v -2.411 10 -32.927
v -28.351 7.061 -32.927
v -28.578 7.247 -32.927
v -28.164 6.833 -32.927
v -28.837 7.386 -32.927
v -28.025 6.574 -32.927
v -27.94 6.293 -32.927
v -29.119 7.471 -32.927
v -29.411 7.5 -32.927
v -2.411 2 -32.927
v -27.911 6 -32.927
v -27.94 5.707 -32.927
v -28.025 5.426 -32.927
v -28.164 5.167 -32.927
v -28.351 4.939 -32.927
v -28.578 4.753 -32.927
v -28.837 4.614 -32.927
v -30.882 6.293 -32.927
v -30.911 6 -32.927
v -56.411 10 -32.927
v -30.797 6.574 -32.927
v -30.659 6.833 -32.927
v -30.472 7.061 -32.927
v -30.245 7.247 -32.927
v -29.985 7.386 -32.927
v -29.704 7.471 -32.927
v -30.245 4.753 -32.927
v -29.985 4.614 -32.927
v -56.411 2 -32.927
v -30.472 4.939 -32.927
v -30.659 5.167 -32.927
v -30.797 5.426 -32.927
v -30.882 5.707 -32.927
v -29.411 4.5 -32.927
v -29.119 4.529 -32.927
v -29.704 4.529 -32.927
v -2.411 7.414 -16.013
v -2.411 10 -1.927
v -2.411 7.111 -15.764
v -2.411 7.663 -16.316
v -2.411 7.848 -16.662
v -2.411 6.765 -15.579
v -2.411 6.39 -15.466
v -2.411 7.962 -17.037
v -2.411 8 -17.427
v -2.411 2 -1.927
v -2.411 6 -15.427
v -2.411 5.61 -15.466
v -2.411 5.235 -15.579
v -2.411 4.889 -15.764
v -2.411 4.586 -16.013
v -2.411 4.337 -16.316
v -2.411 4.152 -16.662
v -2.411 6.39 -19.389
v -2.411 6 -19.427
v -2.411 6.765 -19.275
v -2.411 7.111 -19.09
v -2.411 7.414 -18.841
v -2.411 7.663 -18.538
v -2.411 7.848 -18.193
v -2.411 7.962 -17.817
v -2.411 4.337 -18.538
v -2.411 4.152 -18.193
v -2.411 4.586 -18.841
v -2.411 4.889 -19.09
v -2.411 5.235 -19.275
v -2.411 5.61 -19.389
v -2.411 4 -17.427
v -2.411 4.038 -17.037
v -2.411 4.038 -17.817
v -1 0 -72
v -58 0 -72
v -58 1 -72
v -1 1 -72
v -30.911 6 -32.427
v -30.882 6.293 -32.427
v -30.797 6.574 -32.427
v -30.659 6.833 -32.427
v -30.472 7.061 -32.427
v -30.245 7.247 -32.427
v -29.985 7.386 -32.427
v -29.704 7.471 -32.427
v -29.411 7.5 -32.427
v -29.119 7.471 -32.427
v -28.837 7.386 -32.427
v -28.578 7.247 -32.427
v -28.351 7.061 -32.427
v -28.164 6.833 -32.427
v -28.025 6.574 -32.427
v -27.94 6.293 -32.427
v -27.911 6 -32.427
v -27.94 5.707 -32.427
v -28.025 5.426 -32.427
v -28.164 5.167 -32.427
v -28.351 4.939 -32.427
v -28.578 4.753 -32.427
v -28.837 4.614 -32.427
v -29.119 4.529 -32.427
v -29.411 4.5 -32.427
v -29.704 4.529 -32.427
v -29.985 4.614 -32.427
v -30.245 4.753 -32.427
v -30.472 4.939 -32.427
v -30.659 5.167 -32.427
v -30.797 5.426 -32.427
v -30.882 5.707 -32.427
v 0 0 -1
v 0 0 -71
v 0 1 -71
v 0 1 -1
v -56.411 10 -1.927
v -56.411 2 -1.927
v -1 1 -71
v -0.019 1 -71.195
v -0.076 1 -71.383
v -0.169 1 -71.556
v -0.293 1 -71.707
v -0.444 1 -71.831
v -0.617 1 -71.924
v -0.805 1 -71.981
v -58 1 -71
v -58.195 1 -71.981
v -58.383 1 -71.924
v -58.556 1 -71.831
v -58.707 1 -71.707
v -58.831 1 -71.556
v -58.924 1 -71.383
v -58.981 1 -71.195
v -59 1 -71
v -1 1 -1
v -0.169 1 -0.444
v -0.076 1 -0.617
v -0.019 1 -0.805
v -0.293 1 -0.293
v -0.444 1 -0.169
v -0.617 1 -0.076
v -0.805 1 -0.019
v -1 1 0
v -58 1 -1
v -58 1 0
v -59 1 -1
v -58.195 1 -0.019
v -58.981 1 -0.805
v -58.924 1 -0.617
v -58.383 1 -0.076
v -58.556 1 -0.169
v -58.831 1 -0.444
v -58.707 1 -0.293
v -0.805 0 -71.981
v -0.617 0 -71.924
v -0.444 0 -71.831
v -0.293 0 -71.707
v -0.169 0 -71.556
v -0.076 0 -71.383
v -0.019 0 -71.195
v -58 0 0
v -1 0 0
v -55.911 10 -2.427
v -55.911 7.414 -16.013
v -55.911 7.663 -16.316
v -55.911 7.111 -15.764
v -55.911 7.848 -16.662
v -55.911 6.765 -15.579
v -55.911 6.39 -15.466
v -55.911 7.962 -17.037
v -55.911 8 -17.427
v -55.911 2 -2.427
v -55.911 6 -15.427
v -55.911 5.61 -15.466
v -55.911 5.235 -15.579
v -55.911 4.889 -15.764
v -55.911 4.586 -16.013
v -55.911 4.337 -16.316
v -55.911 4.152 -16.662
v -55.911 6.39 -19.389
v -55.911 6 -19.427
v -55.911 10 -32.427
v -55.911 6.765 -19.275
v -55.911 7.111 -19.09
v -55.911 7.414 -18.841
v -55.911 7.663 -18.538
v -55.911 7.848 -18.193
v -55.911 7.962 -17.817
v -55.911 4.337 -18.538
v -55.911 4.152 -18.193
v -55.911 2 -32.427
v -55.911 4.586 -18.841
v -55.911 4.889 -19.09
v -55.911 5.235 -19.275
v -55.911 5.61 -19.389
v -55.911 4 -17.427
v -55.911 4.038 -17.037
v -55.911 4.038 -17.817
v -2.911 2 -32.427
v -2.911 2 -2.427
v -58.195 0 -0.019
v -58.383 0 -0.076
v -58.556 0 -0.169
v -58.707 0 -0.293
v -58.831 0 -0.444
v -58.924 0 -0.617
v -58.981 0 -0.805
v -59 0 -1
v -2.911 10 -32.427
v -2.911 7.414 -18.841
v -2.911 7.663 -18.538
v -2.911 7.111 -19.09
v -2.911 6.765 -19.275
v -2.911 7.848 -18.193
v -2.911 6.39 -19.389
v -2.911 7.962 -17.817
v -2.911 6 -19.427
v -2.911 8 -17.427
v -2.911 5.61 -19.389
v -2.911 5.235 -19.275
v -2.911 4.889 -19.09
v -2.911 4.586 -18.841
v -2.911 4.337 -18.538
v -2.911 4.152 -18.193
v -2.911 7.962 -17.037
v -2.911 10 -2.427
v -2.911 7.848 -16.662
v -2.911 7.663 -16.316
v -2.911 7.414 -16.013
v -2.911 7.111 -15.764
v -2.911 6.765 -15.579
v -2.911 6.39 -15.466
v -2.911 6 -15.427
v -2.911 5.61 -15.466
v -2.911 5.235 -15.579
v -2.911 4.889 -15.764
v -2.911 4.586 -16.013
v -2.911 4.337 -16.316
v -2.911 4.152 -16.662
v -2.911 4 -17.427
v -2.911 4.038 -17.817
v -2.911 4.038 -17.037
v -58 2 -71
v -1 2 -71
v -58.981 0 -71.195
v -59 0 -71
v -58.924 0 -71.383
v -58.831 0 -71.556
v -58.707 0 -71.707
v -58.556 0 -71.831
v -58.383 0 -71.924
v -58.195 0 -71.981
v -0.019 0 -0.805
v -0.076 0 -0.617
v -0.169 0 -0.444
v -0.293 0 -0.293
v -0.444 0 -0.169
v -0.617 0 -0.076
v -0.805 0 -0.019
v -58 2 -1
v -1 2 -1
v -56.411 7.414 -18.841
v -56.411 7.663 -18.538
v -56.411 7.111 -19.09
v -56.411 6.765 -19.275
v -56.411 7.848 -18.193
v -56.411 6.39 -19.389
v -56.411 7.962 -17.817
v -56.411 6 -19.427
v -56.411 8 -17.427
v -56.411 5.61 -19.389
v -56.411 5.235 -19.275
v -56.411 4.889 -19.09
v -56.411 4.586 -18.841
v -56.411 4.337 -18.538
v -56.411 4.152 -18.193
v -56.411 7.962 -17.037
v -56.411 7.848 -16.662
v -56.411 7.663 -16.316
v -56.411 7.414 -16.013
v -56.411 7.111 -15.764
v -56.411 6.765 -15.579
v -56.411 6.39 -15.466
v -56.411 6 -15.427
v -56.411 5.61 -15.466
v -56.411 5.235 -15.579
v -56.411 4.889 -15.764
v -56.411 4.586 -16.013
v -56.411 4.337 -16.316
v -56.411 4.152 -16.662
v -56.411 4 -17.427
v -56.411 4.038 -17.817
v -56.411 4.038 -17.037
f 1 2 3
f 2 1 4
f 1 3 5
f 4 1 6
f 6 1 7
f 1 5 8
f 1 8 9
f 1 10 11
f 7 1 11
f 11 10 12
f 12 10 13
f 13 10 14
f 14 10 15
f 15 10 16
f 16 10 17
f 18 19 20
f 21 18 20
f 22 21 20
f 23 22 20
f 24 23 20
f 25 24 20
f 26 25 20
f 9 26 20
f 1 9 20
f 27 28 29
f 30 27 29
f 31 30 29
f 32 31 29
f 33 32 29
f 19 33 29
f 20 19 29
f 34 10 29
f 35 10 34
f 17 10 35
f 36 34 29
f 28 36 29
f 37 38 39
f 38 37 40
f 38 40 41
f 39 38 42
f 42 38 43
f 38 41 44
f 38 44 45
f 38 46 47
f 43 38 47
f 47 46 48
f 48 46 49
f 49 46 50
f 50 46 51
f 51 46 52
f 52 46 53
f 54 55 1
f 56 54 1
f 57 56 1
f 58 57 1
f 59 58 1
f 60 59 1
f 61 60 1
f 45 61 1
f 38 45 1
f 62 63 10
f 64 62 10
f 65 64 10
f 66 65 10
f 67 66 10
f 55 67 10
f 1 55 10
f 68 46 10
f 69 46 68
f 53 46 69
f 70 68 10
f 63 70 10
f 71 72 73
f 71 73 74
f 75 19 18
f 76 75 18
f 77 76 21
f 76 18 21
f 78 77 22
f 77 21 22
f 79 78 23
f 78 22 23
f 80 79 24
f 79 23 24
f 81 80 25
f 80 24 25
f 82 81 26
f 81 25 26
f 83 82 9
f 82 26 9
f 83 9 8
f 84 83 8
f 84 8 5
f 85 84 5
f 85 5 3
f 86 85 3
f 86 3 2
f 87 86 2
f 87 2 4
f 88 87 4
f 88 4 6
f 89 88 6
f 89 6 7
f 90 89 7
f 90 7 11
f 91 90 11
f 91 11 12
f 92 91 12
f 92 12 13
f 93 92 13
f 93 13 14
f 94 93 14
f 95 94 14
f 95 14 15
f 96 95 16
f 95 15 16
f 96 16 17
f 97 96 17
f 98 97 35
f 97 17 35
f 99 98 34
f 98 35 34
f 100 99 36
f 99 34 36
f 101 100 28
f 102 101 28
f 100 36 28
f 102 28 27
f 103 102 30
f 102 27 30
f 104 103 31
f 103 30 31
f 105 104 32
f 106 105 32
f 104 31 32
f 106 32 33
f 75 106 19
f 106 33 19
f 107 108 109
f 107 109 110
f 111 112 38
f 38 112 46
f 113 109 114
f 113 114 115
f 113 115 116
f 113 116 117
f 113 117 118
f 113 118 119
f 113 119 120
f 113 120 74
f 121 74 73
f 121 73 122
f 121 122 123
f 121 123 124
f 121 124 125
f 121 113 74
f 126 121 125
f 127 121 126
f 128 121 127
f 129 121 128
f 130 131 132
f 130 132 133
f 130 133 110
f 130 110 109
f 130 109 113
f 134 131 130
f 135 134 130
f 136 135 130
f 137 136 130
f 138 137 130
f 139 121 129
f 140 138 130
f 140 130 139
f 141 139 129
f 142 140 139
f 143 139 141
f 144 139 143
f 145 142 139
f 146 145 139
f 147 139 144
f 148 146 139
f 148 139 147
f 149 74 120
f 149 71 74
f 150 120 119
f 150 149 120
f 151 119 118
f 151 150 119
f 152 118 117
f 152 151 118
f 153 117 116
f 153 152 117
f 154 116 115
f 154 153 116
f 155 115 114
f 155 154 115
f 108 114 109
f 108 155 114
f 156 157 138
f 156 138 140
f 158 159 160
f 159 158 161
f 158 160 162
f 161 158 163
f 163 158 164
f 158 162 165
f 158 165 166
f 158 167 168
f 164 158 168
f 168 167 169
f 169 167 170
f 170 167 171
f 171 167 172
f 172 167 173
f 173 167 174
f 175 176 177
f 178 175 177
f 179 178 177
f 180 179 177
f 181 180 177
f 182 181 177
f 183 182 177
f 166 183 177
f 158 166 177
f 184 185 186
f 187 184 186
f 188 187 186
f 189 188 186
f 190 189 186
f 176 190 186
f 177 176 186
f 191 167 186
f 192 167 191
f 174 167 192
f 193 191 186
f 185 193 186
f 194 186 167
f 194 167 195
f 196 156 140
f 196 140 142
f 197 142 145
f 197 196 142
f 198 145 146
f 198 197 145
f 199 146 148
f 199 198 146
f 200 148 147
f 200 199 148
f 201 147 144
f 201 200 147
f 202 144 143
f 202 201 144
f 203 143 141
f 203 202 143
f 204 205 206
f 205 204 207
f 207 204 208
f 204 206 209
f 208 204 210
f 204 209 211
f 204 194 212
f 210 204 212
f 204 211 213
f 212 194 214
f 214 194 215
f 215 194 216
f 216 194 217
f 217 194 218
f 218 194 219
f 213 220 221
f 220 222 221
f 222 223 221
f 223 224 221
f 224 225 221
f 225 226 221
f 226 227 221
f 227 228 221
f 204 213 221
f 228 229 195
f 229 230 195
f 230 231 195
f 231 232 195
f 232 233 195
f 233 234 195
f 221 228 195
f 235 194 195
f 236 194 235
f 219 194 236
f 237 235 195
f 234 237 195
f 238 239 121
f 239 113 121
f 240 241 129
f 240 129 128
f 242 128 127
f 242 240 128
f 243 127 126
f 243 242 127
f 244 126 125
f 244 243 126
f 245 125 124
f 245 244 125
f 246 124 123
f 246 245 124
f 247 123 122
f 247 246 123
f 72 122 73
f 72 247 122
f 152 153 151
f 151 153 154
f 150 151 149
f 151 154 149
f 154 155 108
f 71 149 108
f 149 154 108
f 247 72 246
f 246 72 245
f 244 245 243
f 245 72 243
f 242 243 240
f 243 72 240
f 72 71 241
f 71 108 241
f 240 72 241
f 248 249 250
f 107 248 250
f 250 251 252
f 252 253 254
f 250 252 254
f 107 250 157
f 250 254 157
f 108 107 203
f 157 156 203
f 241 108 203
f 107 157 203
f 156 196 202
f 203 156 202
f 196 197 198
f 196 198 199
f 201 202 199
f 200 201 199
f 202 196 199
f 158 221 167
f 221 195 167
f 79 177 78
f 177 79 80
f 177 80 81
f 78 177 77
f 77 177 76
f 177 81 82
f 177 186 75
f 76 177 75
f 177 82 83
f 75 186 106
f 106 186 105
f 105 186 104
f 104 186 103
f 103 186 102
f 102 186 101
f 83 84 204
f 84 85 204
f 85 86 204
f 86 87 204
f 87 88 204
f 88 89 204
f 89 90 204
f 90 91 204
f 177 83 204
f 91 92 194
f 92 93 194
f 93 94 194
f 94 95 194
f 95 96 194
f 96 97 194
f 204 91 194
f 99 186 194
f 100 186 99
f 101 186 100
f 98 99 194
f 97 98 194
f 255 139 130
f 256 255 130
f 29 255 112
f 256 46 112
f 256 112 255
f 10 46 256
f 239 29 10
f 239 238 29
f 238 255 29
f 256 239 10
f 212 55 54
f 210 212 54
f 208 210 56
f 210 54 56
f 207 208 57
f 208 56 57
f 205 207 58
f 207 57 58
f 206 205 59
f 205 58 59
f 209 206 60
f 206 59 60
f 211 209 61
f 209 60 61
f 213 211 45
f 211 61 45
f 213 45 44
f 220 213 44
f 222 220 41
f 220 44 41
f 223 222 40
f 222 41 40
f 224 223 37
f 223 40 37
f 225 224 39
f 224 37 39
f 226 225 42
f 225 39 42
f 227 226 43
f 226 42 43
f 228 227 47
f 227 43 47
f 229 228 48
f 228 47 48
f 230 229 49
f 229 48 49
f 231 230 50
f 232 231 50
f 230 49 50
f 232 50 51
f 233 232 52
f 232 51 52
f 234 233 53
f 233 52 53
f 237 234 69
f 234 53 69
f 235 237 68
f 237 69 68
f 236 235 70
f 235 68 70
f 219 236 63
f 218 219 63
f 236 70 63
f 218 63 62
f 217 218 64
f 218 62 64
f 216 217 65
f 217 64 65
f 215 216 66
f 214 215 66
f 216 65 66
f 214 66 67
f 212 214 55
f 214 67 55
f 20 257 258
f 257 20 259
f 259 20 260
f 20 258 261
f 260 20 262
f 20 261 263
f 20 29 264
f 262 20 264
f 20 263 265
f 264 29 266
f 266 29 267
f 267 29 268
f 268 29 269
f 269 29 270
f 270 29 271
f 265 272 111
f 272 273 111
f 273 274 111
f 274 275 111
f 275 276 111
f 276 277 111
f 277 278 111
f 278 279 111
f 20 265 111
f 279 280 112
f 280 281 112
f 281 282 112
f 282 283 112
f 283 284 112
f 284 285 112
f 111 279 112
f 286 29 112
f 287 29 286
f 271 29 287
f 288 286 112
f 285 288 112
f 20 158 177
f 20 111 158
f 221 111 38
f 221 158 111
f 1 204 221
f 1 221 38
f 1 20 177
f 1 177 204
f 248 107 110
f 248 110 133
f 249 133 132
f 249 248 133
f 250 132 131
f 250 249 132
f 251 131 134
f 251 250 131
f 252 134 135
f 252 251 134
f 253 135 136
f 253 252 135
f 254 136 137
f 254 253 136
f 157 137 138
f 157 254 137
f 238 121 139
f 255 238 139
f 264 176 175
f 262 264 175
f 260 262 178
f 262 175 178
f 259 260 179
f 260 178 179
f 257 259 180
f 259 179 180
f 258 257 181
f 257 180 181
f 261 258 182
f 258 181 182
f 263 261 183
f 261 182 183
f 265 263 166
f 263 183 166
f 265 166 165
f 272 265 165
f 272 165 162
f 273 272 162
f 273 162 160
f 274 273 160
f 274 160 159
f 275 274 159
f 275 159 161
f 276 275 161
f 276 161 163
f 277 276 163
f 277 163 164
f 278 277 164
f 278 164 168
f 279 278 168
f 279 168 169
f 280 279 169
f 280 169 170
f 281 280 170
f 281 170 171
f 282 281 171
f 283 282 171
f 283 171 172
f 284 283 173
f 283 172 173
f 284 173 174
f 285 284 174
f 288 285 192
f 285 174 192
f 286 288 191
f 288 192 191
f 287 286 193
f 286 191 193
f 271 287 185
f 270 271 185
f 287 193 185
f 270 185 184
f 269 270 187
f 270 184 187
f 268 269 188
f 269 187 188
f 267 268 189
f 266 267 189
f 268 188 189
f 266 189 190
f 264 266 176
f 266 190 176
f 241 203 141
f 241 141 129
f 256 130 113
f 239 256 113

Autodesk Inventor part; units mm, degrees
ref_plane "YZ Plane" through (0, 0, 0) normal (1, 0, 0) x (0, 1, 0)
ref_plane "XZ Plane" through (0, 0, 0) normal (0, 1, 0) x (-1, 0, 0)
ref_plane "XY Plane" through (0, 0, 0) normal (0, 0, 1) x (1, 0, 0)
sketch "Sketch1" plane through (0, 0, 0) normal (0, 1, 0) x (-1, 0, 0)
  line L0 (1, 0) -> (58, 0)
  line L1 (59, -1) -> (59, -71)
  line L2 (58, -72) -> (1, -72)
  line L3 (0, -71) -> (0, -1)
  arc A0 (59, -1) -> (58, 0) centre (58, -1) ccw
  arc A1 (58, -72) -> (59, -71) centre (58, -71) ccw
  arc A2 (0, -71) -> (1, -72) centre (1, -71) ccw
  arc A3 (1, 0) -> (0, -1) centre (1, -1) ccw
  point P0 (0, 0)
  point P1 (59, -72)
  point P2 (59, 0)
  point P3 (0, -72)
  dimension "d0" = 72
  dimension "d1" = 59
  dimension "d2" = 1
extrude "Extrusion1" add sketch "Sketch1" along normal blind 1
sketch "Sketch2" plane through (0, 1, 0) normal (0, 1, 0) x (1, 0, 0)
  line L0 (-55.9113, 2.4272) -> (-2.9113, 2.4272)
  line L1 (-2.9113, 2.4272) -> (-2.9113, 32.4272)
  line L2 (-2.9113, 32.4272) -> (-55.9113, 32.4272)
  line L3 (-55.9113, 32.4272) -> (-55.9113, 2.4272)
  line L4 (-56.4113, 1.9272) -> (-2.4113, 1.9272)
  line L5 (-2.4113, 1.9272) -> (-2.4113, 32.9272)
  line L6 (-2.4113, 32.9272) -> (-56.4113, 32.9272)
  line L7 (-56.4113, 32.9272) -> (-56.4113, 1.9272)
  point P0 (0, 0)
  dimension "d5" = 30
  dimension "d6" = 53
  dimension "d7" = 0.5
  dimension "d8" = 0.5
  dimension "d9" = 0.5
  dimension "d10" = 0.5
extrude "Extrusion2" add sketch "Sketch2" along normal blind 4
sketch "Sketch3" plane through (0, 1, 0) normal (0, 1, 0) x (1, 0, 0)
  arc A0 (0, 71) -> (-1, 72) centre (-1, 71) ccw projected
  line L0 (-58, 1) -> (-1, 1)
  line L1 (-1, 1) -> (-1, 71)
  line L2 (-1, 71) -> (-58, 71)
  line L3 (-58, 71) -> (-58, 1)
  line L4 (-1, 72) -> (-58, 72) projected
  line L5 (-59, 71) -> (-59, 1) projected
  line L6 (-58, 0) -> (-1, 0) projected
  line L7 (0, 1) -> (0, 71) projected
  point P0 (0, 0)
  dimension "d13" = 1
  dimension "d14" = 1
  dimension "d15" = 1
  dimension "d16" = 1
extrude "Extrusion3" add sketch "Sketch3" along normal blind 1
sketch "Sketch4" plane through (0, 5, 0) normal (0, 1, 0) x (1, 0, 0)
  line L0 (-2.4113, 1.9272) -> (-2.4113, 32.9272) projected
  line L1 (-2.9113, 32.4272) -> (-2.9113, 2.4272) projected
  line L2 (-56.4113, 1.9272) -> (-2.4113, 1.9272) projected
  line L3 (-2.9113, 2.4272) -> (-55.9113, 2.4272) projected
  line L4 (-2.4113, 32.9272) -> (-56.4113, 32.9272) projected
  line L5 (-55.9113, 32.4272) -> (-2.9113, 32.4272) projected
  line L6 (-55.9113, 2.4272) -> (-55.9113, 32.4272) projected
  line L7 (-56.4113, 32.9272) -> (-56.4113, 1.9272) projected
  point P0 (0, 0)
extrude "Extrusion4" add sketch "Sketch4" along normal blind 5
sketch "Sketch5" plane through (-2.4113, 2, -1.9272) normal (1, 0, 0) x (0, 0, -1)
  line L0 (0, 0) -> (31, 0) projected
  line L1 (31, 0) -> (31, 8) projected
  line L2 (0, 8) -> (31, 8) projected
  line L3 (0, 0) -> (0, 8) projected
  circle A0 centre (15.5, 4) radius 2
  point P0 (-1.9272, -2)
  dimension "d21" = 4
extrude "Extrusion6" cut sketch "Sketch5" against normal through all contours A0
sketch "Sketch7" plane through (-2.4113, 2, -32.9272) normal (0, 0, -1) x (-1, 0, 0)
  line L0 (0, 0) -> (54, 0) projected
  line L1 (54, 0) -> (54, 8) projected
  line L2 (0, 8) -> (54, 8) projected
  line L3 (0, 0) -> (0, 8) projected
  circle A0 centre (27, 4) radius 1.5
  point P0 (-2.4113, -2)
  dimension "d26" = 3
extrude "Extrusion7" cut sketch "Sketch7" against normal blind 3 contours A0
properties part number "tapa caja arduino"
